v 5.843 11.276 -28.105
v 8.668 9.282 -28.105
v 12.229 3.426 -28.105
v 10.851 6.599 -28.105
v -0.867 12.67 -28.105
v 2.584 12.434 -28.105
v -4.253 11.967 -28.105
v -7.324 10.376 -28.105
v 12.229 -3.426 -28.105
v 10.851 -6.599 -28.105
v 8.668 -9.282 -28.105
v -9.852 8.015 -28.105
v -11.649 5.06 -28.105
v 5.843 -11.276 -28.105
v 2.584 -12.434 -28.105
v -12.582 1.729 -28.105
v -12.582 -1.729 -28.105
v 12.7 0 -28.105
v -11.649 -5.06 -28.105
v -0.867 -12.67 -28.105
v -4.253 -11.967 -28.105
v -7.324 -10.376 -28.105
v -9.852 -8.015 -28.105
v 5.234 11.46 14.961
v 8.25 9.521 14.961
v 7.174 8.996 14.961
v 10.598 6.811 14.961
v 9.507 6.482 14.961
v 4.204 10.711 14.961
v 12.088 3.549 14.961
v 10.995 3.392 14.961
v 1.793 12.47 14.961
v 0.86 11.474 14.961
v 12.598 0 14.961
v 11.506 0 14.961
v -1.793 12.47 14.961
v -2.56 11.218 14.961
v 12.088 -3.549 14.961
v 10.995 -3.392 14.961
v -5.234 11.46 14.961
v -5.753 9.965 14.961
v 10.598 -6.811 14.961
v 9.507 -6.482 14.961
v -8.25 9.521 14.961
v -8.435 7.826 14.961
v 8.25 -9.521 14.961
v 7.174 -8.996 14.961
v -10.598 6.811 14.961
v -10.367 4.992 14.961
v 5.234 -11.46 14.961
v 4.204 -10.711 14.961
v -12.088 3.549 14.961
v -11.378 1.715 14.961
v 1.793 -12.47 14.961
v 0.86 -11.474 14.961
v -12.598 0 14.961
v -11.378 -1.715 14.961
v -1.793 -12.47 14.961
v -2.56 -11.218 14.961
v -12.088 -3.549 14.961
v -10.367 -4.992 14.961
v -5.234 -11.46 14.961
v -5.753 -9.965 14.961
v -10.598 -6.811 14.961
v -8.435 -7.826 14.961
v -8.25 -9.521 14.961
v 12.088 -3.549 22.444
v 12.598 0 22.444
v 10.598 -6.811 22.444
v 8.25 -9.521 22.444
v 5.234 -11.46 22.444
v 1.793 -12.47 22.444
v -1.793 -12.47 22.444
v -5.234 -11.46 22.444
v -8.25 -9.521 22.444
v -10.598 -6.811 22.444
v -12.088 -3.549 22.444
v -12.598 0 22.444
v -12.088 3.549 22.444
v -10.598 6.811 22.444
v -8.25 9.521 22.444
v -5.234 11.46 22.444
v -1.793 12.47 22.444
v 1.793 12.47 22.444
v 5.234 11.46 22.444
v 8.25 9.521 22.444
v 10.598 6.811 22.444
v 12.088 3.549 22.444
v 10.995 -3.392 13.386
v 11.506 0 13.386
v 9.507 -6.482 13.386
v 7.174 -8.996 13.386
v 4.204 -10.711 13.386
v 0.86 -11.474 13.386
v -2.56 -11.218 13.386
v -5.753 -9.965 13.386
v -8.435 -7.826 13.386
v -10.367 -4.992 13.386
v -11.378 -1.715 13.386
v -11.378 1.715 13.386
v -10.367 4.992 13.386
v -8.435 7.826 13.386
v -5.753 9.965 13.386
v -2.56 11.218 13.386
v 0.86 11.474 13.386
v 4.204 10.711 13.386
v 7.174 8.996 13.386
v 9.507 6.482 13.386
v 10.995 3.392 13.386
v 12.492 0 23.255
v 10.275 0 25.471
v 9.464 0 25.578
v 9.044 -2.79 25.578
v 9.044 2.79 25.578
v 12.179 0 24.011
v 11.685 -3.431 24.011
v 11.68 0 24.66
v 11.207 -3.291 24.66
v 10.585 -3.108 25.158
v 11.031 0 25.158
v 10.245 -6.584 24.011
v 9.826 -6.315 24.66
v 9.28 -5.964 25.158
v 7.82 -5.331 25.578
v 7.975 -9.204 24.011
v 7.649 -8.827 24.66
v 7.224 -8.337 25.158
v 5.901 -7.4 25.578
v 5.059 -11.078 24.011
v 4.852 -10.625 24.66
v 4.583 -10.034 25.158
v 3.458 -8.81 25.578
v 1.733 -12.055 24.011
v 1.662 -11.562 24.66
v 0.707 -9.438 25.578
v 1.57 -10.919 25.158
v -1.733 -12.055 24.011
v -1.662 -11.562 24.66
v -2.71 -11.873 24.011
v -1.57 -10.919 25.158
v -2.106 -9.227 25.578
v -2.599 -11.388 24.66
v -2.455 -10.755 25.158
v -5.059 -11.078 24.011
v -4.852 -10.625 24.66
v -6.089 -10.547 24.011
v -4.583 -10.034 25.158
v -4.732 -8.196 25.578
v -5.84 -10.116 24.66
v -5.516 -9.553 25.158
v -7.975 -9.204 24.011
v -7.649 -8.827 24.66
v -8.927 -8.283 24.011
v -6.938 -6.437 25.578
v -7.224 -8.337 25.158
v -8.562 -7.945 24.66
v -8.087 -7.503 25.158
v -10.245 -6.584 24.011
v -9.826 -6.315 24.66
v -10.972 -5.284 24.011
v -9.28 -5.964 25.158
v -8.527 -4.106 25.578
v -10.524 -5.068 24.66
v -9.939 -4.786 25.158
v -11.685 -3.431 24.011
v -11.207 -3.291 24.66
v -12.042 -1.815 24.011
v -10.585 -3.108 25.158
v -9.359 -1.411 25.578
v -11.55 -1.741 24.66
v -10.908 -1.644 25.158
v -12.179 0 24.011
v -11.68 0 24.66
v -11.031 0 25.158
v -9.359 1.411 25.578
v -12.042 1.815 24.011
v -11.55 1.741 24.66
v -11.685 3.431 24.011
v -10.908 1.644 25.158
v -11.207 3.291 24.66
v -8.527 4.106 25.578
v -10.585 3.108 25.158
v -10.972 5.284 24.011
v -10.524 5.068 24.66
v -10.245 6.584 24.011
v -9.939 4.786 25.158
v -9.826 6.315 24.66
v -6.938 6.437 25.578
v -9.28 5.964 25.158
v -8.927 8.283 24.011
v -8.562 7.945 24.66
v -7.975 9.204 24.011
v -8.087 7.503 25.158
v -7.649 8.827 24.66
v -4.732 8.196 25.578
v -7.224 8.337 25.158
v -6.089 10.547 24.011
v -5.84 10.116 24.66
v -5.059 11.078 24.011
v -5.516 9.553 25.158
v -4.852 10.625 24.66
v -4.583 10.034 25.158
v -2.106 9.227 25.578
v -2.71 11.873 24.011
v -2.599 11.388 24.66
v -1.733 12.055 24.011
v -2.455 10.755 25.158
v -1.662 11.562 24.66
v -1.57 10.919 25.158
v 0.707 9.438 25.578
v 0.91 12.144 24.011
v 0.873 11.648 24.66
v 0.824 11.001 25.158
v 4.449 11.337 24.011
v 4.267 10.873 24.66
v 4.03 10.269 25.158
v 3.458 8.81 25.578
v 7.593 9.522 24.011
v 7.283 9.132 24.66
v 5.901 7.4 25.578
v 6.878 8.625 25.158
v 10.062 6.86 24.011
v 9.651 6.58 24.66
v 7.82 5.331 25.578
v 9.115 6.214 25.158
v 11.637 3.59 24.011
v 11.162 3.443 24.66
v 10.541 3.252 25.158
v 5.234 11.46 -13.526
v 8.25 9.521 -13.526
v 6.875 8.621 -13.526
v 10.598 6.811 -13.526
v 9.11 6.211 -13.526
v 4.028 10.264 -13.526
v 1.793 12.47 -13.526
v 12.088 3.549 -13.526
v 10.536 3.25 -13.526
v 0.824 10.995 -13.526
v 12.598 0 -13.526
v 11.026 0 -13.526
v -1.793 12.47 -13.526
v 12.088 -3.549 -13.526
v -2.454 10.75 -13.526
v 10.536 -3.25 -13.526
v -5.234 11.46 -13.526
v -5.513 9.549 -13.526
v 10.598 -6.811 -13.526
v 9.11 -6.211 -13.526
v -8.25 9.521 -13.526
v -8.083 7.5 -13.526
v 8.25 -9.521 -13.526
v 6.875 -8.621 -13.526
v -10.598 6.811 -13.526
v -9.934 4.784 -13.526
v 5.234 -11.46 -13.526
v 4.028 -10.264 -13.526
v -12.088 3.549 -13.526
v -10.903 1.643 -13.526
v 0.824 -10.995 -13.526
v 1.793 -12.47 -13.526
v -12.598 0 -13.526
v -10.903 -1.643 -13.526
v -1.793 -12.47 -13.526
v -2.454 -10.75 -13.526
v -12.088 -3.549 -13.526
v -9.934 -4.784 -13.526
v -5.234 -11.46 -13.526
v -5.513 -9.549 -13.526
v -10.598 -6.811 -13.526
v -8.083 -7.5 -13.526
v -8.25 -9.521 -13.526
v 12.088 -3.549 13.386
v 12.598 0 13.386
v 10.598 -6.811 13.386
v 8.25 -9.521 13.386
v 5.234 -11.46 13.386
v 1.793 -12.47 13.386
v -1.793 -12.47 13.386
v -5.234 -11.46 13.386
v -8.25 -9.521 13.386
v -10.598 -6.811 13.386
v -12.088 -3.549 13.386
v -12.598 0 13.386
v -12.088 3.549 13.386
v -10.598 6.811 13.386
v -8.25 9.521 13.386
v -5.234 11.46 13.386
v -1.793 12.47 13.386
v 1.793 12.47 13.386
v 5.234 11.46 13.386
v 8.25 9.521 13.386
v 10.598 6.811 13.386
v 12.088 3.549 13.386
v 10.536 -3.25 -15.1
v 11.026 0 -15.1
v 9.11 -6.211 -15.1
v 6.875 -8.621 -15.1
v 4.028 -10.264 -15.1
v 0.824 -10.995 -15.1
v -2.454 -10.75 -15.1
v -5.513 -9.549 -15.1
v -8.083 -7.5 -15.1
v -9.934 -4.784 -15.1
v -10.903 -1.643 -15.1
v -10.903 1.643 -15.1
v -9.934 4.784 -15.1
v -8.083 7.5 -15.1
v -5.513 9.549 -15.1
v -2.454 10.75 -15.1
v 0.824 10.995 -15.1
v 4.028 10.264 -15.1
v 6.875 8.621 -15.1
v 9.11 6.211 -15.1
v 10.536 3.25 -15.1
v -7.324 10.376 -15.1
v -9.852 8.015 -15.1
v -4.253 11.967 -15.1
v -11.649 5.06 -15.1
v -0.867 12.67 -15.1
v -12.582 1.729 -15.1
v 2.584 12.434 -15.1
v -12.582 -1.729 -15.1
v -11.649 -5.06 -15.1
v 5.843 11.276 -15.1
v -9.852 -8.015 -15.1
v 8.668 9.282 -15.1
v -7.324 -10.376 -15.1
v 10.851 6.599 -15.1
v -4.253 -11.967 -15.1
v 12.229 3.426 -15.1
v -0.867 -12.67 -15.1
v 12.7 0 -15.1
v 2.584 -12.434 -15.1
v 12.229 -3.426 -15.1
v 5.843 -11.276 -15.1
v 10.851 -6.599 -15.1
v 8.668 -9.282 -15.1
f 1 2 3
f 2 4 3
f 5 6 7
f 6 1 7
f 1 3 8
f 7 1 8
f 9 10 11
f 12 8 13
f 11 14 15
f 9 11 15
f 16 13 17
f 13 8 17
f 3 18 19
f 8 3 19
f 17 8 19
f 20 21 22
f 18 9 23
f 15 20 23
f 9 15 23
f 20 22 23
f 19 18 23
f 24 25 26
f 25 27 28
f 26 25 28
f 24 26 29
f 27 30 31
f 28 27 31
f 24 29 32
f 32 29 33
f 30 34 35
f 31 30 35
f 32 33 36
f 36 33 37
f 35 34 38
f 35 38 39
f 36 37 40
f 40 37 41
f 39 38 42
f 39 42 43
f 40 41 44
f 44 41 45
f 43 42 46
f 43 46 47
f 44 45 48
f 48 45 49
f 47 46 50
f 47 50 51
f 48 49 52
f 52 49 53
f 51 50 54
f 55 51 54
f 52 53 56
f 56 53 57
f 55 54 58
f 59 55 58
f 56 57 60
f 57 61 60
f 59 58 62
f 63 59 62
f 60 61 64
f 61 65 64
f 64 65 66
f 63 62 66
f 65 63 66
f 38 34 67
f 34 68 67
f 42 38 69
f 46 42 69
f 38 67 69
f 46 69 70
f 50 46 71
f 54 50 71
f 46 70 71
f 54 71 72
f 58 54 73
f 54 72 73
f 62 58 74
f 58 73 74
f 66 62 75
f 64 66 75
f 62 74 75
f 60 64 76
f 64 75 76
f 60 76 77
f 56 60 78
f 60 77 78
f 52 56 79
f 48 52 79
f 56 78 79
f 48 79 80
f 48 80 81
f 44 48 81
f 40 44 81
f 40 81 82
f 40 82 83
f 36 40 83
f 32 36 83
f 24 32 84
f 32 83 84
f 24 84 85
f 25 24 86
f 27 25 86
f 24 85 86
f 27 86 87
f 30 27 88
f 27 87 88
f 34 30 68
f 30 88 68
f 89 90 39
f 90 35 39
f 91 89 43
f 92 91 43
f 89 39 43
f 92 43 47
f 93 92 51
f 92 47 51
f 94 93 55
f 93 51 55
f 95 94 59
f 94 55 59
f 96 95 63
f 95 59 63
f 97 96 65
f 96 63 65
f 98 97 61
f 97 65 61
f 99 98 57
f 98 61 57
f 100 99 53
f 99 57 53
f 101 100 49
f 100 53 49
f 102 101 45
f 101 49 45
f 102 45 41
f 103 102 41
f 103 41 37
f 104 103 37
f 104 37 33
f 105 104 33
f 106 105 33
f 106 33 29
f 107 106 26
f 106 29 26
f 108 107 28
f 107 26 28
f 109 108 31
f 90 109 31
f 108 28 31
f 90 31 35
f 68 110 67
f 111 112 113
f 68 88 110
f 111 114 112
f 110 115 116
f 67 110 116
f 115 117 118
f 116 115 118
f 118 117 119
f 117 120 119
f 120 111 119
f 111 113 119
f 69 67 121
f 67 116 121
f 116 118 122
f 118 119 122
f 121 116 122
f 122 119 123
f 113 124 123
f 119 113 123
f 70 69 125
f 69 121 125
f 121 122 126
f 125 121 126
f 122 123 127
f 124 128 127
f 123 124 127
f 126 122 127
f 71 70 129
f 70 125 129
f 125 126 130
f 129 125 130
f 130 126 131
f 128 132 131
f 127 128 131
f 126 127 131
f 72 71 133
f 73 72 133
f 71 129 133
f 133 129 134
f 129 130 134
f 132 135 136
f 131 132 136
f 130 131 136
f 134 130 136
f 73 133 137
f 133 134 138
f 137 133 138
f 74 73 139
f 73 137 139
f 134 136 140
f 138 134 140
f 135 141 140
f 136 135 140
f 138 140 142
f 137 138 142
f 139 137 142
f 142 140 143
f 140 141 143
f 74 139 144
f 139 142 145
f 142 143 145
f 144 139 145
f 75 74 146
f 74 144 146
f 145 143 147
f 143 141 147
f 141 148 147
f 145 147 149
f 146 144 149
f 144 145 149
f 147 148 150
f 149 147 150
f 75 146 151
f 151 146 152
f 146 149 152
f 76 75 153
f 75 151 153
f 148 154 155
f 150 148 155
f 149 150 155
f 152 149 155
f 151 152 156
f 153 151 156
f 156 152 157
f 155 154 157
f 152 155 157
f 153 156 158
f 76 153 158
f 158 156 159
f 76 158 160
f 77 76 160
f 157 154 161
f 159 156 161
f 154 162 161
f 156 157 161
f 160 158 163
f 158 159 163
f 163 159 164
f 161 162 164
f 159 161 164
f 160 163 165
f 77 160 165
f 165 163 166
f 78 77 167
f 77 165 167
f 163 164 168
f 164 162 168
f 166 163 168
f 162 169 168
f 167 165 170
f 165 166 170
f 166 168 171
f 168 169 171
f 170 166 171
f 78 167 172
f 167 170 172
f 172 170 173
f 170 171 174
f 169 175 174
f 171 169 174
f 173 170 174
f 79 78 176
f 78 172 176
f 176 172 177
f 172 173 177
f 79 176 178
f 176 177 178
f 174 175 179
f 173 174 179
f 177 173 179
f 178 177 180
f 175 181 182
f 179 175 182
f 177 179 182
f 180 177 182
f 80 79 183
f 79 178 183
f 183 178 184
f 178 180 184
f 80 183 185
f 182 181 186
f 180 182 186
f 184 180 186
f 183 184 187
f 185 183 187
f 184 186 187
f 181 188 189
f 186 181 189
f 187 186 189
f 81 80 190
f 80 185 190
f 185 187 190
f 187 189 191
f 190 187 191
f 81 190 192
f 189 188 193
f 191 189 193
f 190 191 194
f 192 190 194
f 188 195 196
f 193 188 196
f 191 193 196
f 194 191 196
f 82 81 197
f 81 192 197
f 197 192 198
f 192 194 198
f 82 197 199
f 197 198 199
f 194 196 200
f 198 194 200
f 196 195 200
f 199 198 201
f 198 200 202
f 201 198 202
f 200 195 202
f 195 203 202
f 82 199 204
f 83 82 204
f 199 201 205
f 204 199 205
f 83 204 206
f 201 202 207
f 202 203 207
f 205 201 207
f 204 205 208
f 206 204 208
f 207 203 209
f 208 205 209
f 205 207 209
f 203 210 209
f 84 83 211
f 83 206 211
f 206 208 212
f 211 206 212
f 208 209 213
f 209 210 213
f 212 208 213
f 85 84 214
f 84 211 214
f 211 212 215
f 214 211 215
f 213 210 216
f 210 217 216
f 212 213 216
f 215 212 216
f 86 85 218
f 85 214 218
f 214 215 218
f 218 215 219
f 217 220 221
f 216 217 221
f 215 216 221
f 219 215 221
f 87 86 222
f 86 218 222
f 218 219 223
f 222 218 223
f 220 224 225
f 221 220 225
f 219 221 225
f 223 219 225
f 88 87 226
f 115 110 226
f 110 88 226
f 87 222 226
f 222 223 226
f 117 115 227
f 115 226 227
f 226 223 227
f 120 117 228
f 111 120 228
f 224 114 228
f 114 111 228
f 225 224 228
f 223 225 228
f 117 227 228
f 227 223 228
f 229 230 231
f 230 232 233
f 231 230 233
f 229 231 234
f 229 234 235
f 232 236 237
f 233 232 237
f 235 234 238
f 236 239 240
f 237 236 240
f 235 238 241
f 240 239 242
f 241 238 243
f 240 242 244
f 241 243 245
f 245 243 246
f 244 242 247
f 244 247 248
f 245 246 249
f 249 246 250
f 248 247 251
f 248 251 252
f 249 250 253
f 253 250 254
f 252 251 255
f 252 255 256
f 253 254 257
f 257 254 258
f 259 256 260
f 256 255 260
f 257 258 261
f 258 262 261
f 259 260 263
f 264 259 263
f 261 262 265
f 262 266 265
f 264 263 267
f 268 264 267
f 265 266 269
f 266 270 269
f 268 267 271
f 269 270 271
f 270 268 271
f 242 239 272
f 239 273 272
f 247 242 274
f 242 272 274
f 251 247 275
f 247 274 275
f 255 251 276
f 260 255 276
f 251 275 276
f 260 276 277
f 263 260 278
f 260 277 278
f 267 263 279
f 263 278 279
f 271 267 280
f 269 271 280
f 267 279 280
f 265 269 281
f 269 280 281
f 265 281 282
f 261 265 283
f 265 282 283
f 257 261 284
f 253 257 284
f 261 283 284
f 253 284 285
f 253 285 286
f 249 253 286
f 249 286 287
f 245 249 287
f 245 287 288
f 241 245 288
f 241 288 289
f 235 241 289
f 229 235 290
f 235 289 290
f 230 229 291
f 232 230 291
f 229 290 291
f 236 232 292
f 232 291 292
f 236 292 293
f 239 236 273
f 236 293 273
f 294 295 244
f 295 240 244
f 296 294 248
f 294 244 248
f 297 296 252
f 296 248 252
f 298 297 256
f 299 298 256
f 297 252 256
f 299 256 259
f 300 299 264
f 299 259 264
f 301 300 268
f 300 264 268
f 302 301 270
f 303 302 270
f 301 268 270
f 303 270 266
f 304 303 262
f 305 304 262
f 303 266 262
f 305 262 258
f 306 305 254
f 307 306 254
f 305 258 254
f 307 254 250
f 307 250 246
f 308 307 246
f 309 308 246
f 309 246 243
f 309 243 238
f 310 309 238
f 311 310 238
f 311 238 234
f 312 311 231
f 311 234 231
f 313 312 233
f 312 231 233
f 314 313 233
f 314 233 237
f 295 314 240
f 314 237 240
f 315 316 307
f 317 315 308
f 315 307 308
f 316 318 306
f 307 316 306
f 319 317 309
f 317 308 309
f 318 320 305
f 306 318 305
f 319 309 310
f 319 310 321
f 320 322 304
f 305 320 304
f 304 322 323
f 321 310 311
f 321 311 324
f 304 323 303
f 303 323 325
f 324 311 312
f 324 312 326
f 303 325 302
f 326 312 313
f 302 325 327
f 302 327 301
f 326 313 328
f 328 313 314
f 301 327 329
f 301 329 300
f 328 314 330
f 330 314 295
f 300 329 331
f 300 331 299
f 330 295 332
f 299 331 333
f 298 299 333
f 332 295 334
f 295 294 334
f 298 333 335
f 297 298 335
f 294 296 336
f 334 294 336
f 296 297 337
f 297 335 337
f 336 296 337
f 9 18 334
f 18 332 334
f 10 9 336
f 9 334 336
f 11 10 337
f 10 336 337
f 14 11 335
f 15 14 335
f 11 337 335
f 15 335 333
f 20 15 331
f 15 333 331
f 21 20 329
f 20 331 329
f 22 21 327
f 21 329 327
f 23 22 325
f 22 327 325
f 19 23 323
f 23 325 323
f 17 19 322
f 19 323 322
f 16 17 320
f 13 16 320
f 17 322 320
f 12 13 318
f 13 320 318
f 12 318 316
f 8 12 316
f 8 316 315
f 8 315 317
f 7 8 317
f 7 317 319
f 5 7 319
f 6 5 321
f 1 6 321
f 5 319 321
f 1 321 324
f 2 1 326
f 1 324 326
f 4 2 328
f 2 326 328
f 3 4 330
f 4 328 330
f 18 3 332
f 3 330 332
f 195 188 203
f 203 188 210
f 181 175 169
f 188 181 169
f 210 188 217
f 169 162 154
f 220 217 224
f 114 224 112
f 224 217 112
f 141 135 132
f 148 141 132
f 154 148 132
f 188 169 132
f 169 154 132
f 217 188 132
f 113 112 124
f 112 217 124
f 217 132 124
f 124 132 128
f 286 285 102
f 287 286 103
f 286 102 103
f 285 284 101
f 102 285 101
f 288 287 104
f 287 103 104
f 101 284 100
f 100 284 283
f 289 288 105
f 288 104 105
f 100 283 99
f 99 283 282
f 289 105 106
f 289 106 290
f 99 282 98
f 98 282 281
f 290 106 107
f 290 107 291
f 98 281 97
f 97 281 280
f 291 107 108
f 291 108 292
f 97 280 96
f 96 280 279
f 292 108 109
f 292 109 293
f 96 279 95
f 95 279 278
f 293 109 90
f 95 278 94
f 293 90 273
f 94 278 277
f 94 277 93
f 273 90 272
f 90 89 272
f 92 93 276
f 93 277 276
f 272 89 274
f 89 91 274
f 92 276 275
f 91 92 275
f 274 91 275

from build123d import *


with BuildPart() as f1:
    # F0 (on Front) → F1 (revolve)
    with BuildSketch(Plane.XZ):
        with BuildLine():
            Line((12.5984, 13.3858), (11.5062, 13.3858))
            Line((11.5062, 13.3858), (11.5062, 14.9606))
            Line((11.5062, 14.9606), (12.5984, 14.9606))
            Line((12.5984, 14.9606), (12.5984, 22.44372))
            ThreePointArc((12.5984, 22.44372), (11.680449, 24.659849), (9.46432, 25.5778))
            Line((9.46432, 25.5778), (0, 25.5778))
            Line((0, 25.5778), (0, -28.1051))
            Line((0, -28.1051), (12.7, -28.1051))
            Line((12.7, -28.1051), (12.7, -15.1003))
            Line((12.7, -15.1003), (11.02614, -15.1003))
            Line((11.02614, -15.1003), (11.02614, -13.5255))
            Line((11.02614, -13.5255), (12.5984, -13.5255))
            Line((12.5984, -13.5255), (12.5984, 13.3858))
        make_face()
    revolve(axis=Axis((0, 0, -1.26365), (0, 0, -1)))


solid = f1.part
